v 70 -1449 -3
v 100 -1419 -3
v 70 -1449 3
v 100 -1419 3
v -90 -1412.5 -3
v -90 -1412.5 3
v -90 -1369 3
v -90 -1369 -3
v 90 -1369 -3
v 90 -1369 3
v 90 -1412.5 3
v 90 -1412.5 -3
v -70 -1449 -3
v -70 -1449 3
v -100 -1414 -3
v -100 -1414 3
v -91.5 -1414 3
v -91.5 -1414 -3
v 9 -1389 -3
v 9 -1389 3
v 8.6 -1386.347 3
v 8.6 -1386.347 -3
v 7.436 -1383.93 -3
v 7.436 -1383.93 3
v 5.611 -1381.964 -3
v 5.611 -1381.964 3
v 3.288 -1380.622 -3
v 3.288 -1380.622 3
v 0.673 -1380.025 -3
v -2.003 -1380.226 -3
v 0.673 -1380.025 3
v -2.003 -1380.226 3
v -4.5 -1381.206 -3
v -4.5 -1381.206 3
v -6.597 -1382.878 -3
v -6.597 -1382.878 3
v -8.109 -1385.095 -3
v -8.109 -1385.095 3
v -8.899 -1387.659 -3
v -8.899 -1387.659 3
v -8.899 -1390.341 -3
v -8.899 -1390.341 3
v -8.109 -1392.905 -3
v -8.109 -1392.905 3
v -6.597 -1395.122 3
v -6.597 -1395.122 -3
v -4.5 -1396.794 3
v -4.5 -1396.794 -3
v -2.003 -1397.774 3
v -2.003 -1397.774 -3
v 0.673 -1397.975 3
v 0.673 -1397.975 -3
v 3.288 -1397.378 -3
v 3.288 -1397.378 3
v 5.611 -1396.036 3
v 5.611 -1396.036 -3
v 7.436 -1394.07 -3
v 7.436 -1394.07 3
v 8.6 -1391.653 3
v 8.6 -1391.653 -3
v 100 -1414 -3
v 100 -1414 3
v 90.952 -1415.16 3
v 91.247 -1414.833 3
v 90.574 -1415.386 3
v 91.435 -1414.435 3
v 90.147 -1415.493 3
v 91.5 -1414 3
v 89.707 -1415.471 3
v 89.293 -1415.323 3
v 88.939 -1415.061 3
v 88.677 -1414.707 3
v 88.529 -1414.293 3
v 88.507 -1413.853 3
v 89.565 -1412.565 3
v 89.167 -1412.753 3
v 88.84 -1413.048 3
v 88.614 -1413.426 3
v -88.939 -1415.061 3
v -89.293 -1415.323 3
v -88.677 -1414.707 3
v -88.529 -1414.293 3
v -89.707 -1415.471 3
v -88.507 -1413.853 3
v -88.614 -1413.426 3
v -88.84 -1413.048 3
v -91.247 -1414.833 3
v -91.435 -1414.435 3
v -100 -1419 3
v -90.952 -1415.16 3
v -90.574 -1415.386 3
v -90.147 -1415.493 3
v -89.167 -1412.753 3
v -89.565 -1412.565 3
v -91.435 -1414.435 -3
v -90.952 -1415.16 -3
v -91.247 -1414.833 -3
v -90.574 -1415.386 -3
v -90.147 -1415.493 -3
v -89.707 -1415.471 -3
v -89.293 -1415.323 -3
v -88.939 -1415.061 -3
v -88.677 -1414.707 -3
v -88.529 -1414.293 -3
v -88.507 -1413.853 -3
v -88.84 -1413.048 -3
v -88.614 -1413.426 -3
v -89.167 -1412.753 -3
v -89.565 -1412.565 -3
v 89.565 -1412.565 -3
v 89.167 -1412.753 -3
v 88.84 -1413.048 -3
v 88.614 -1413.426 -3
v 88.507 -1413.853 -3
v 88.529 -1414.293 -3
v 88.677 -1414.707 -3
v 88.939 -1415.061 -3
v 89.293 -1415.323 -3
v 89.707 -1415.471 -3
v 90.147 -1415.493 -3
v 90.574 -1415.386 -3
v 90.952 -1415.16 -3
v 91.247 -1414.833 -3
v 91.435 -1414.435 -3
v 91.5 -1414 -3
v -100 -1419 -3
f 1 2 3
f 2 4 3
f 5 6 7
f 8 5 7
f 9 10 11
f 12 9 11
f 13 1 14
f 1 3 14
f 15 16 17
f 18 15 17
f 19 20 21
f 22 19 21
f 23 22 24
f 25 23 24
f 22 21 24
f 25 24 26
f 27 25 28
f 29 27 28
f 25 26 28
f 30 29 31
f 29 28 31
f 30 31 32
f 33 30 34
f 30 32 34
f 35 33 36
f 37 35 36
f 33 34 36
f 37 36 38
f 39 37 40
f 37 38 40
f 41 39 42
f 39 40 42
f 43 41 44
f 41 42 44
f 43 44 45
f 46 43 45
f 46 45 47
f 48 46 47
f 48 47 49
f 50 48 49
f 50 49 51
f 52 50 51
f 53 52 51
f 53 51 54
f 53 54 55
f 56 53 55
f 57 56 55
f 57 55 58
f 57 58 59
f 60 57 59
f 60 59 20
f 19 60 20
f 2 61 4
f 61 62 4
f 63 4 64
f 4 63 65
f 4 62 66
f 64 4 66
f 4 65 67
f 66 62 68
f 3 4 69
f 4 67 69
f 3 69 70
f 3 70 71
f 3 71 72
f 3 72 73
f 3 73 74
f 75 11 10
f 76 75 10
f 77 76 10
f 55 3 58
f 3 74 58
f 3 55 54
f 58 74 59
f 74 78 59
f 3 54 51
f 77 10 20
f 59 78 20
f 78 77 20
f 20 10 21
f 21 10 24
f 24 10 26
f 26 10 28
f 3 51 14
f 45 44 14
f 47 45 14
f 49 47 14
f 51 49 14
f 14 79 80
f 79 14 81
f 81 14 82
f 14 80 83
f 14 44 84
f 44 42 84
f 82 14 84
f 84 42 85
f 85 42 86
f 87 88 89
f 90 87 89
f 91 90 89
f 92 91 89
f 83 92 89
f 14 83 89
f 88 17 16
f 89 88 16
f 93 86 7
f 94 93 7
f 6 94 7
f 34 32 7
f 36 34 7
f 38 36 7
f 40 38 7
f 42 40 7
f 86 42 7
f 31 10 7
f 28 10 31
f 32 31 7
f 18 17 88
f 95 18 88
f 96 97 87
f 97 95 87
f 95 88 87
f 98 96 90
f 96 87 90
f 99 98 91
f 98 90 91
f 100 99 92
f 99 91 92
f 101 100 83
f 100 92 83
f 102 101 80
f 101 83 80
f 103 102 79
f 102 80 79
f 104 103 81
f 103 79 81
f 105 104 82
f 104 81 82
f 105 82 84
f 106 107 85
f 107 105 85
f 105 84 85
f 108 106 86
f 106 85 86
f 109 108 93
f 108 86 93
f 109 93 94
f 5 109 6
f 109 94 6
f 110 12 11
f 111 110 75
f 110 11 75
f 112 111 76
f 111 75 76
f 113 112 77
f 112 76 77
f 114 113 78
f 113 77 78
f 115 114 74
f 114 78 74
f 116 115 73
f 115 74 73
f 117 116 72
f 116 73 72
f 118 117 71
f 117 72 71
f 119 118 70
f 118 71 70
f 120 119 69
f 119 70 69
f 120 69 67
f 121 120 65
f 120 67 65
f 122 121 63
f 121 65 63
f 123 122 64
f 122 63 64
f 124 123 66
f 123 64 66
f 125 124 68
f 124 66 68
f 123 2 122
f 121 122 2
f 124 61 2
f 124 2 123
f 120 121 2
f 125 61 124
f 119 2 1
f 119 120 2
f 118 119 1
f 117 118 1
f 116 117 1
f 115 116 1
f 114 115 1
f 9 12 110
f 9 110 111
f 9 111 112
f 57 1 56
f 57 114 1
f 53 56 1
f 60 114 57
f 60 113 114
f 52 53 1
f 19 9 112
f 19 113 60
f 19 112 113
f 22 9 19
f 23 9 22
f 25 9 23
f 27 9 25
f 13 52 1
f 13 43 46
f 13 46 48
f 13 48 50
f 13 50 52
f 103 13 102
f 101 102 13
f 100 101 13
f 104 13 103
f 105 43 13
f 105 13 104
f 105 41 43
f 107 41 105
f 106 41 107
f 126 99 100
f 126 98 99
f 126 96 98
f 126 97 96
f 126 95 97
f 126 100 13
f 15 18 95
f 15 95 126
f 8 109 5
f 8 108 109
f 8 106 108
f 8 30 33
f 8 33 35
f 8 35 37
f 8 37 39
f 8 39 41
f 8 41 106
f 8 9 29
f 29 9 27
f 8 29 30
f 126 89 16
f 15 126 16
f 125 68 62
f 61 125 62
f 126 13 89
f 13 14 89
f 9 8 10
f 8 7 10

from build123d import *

# Parameters (mm, degrees)
BOSS_EXTRUDE1_DEPTH      = 3
BOSS_EXTRUDE1_DEPTH_BACK = 3
SKETCH2_R                = 9
CUT_EXTRUDE1_DEPTH       = 1
CUT_EXTRUDE1_DEPTH_BACK  = 7
SKETCH3_R                = 1.5
CUT_EXTRUDE2_DEPTH       = 1
CUT_EXTRUDE2_DEPTH_BACK  = 7


with BuildPart() as part:
    # Sketch1 → Boss-Extrude1 (new body, two sides)
    with BuildSketch(Plane.XY) as boss_extrude1_sk:
        Polygon((-90, -1414), (-90, -1369), (90, -1369), (90, -1414), (100, -1414), (100, -1419), (70, -1449), (-70, -1449), (-100, -1419), (-100, -1414), align=None)
    extrude(amount=BOSS_EXTRUDE1_DEPTH)
    extrude(boss_extrude1_sk.sketch, amount=-BOSS_EXTRUDE1_DEPTH_BACK)

    # Sketch2 → Cut-Extrude1 (cut, two sides)
    with BuildSketch(Plane.XY.offset(3)) as cut_extrude1_sk:
        with Locations((0, -1389)):
            Circle(SKETCH2_R)
    extrude(amount=CUT_EXTRUDE1_DEPTH, mode=Mode.SUBTRACT)
    extrude(cut_extrude1_sk.sketch, amount=-CUT_EXTRUDE1_DEPTH_BACK, mode=Mode.SUBTRACT)

    # Sketch3 → Cut-Extrude2 (cut, two sides)
    with BuildSketch(Plane.XY.offset(3)) as cut_extrude2_sk:
        with Locations((-90, -1414)):
            Circle(SKETCH3_R)
        with Locations((90, -1414)):
            Circle(SKETCH3_R)
    extrude(amount=CUT_EXTRUDE2_DEPTH, mode=Mode.SUBTRACT)
    extrude(cut_extrude2_sk.sketch, amount=-CUT_EXTRUDE2_DEPTH_BACK, mode=Mode.SUBTRACT)


solid = part.part
